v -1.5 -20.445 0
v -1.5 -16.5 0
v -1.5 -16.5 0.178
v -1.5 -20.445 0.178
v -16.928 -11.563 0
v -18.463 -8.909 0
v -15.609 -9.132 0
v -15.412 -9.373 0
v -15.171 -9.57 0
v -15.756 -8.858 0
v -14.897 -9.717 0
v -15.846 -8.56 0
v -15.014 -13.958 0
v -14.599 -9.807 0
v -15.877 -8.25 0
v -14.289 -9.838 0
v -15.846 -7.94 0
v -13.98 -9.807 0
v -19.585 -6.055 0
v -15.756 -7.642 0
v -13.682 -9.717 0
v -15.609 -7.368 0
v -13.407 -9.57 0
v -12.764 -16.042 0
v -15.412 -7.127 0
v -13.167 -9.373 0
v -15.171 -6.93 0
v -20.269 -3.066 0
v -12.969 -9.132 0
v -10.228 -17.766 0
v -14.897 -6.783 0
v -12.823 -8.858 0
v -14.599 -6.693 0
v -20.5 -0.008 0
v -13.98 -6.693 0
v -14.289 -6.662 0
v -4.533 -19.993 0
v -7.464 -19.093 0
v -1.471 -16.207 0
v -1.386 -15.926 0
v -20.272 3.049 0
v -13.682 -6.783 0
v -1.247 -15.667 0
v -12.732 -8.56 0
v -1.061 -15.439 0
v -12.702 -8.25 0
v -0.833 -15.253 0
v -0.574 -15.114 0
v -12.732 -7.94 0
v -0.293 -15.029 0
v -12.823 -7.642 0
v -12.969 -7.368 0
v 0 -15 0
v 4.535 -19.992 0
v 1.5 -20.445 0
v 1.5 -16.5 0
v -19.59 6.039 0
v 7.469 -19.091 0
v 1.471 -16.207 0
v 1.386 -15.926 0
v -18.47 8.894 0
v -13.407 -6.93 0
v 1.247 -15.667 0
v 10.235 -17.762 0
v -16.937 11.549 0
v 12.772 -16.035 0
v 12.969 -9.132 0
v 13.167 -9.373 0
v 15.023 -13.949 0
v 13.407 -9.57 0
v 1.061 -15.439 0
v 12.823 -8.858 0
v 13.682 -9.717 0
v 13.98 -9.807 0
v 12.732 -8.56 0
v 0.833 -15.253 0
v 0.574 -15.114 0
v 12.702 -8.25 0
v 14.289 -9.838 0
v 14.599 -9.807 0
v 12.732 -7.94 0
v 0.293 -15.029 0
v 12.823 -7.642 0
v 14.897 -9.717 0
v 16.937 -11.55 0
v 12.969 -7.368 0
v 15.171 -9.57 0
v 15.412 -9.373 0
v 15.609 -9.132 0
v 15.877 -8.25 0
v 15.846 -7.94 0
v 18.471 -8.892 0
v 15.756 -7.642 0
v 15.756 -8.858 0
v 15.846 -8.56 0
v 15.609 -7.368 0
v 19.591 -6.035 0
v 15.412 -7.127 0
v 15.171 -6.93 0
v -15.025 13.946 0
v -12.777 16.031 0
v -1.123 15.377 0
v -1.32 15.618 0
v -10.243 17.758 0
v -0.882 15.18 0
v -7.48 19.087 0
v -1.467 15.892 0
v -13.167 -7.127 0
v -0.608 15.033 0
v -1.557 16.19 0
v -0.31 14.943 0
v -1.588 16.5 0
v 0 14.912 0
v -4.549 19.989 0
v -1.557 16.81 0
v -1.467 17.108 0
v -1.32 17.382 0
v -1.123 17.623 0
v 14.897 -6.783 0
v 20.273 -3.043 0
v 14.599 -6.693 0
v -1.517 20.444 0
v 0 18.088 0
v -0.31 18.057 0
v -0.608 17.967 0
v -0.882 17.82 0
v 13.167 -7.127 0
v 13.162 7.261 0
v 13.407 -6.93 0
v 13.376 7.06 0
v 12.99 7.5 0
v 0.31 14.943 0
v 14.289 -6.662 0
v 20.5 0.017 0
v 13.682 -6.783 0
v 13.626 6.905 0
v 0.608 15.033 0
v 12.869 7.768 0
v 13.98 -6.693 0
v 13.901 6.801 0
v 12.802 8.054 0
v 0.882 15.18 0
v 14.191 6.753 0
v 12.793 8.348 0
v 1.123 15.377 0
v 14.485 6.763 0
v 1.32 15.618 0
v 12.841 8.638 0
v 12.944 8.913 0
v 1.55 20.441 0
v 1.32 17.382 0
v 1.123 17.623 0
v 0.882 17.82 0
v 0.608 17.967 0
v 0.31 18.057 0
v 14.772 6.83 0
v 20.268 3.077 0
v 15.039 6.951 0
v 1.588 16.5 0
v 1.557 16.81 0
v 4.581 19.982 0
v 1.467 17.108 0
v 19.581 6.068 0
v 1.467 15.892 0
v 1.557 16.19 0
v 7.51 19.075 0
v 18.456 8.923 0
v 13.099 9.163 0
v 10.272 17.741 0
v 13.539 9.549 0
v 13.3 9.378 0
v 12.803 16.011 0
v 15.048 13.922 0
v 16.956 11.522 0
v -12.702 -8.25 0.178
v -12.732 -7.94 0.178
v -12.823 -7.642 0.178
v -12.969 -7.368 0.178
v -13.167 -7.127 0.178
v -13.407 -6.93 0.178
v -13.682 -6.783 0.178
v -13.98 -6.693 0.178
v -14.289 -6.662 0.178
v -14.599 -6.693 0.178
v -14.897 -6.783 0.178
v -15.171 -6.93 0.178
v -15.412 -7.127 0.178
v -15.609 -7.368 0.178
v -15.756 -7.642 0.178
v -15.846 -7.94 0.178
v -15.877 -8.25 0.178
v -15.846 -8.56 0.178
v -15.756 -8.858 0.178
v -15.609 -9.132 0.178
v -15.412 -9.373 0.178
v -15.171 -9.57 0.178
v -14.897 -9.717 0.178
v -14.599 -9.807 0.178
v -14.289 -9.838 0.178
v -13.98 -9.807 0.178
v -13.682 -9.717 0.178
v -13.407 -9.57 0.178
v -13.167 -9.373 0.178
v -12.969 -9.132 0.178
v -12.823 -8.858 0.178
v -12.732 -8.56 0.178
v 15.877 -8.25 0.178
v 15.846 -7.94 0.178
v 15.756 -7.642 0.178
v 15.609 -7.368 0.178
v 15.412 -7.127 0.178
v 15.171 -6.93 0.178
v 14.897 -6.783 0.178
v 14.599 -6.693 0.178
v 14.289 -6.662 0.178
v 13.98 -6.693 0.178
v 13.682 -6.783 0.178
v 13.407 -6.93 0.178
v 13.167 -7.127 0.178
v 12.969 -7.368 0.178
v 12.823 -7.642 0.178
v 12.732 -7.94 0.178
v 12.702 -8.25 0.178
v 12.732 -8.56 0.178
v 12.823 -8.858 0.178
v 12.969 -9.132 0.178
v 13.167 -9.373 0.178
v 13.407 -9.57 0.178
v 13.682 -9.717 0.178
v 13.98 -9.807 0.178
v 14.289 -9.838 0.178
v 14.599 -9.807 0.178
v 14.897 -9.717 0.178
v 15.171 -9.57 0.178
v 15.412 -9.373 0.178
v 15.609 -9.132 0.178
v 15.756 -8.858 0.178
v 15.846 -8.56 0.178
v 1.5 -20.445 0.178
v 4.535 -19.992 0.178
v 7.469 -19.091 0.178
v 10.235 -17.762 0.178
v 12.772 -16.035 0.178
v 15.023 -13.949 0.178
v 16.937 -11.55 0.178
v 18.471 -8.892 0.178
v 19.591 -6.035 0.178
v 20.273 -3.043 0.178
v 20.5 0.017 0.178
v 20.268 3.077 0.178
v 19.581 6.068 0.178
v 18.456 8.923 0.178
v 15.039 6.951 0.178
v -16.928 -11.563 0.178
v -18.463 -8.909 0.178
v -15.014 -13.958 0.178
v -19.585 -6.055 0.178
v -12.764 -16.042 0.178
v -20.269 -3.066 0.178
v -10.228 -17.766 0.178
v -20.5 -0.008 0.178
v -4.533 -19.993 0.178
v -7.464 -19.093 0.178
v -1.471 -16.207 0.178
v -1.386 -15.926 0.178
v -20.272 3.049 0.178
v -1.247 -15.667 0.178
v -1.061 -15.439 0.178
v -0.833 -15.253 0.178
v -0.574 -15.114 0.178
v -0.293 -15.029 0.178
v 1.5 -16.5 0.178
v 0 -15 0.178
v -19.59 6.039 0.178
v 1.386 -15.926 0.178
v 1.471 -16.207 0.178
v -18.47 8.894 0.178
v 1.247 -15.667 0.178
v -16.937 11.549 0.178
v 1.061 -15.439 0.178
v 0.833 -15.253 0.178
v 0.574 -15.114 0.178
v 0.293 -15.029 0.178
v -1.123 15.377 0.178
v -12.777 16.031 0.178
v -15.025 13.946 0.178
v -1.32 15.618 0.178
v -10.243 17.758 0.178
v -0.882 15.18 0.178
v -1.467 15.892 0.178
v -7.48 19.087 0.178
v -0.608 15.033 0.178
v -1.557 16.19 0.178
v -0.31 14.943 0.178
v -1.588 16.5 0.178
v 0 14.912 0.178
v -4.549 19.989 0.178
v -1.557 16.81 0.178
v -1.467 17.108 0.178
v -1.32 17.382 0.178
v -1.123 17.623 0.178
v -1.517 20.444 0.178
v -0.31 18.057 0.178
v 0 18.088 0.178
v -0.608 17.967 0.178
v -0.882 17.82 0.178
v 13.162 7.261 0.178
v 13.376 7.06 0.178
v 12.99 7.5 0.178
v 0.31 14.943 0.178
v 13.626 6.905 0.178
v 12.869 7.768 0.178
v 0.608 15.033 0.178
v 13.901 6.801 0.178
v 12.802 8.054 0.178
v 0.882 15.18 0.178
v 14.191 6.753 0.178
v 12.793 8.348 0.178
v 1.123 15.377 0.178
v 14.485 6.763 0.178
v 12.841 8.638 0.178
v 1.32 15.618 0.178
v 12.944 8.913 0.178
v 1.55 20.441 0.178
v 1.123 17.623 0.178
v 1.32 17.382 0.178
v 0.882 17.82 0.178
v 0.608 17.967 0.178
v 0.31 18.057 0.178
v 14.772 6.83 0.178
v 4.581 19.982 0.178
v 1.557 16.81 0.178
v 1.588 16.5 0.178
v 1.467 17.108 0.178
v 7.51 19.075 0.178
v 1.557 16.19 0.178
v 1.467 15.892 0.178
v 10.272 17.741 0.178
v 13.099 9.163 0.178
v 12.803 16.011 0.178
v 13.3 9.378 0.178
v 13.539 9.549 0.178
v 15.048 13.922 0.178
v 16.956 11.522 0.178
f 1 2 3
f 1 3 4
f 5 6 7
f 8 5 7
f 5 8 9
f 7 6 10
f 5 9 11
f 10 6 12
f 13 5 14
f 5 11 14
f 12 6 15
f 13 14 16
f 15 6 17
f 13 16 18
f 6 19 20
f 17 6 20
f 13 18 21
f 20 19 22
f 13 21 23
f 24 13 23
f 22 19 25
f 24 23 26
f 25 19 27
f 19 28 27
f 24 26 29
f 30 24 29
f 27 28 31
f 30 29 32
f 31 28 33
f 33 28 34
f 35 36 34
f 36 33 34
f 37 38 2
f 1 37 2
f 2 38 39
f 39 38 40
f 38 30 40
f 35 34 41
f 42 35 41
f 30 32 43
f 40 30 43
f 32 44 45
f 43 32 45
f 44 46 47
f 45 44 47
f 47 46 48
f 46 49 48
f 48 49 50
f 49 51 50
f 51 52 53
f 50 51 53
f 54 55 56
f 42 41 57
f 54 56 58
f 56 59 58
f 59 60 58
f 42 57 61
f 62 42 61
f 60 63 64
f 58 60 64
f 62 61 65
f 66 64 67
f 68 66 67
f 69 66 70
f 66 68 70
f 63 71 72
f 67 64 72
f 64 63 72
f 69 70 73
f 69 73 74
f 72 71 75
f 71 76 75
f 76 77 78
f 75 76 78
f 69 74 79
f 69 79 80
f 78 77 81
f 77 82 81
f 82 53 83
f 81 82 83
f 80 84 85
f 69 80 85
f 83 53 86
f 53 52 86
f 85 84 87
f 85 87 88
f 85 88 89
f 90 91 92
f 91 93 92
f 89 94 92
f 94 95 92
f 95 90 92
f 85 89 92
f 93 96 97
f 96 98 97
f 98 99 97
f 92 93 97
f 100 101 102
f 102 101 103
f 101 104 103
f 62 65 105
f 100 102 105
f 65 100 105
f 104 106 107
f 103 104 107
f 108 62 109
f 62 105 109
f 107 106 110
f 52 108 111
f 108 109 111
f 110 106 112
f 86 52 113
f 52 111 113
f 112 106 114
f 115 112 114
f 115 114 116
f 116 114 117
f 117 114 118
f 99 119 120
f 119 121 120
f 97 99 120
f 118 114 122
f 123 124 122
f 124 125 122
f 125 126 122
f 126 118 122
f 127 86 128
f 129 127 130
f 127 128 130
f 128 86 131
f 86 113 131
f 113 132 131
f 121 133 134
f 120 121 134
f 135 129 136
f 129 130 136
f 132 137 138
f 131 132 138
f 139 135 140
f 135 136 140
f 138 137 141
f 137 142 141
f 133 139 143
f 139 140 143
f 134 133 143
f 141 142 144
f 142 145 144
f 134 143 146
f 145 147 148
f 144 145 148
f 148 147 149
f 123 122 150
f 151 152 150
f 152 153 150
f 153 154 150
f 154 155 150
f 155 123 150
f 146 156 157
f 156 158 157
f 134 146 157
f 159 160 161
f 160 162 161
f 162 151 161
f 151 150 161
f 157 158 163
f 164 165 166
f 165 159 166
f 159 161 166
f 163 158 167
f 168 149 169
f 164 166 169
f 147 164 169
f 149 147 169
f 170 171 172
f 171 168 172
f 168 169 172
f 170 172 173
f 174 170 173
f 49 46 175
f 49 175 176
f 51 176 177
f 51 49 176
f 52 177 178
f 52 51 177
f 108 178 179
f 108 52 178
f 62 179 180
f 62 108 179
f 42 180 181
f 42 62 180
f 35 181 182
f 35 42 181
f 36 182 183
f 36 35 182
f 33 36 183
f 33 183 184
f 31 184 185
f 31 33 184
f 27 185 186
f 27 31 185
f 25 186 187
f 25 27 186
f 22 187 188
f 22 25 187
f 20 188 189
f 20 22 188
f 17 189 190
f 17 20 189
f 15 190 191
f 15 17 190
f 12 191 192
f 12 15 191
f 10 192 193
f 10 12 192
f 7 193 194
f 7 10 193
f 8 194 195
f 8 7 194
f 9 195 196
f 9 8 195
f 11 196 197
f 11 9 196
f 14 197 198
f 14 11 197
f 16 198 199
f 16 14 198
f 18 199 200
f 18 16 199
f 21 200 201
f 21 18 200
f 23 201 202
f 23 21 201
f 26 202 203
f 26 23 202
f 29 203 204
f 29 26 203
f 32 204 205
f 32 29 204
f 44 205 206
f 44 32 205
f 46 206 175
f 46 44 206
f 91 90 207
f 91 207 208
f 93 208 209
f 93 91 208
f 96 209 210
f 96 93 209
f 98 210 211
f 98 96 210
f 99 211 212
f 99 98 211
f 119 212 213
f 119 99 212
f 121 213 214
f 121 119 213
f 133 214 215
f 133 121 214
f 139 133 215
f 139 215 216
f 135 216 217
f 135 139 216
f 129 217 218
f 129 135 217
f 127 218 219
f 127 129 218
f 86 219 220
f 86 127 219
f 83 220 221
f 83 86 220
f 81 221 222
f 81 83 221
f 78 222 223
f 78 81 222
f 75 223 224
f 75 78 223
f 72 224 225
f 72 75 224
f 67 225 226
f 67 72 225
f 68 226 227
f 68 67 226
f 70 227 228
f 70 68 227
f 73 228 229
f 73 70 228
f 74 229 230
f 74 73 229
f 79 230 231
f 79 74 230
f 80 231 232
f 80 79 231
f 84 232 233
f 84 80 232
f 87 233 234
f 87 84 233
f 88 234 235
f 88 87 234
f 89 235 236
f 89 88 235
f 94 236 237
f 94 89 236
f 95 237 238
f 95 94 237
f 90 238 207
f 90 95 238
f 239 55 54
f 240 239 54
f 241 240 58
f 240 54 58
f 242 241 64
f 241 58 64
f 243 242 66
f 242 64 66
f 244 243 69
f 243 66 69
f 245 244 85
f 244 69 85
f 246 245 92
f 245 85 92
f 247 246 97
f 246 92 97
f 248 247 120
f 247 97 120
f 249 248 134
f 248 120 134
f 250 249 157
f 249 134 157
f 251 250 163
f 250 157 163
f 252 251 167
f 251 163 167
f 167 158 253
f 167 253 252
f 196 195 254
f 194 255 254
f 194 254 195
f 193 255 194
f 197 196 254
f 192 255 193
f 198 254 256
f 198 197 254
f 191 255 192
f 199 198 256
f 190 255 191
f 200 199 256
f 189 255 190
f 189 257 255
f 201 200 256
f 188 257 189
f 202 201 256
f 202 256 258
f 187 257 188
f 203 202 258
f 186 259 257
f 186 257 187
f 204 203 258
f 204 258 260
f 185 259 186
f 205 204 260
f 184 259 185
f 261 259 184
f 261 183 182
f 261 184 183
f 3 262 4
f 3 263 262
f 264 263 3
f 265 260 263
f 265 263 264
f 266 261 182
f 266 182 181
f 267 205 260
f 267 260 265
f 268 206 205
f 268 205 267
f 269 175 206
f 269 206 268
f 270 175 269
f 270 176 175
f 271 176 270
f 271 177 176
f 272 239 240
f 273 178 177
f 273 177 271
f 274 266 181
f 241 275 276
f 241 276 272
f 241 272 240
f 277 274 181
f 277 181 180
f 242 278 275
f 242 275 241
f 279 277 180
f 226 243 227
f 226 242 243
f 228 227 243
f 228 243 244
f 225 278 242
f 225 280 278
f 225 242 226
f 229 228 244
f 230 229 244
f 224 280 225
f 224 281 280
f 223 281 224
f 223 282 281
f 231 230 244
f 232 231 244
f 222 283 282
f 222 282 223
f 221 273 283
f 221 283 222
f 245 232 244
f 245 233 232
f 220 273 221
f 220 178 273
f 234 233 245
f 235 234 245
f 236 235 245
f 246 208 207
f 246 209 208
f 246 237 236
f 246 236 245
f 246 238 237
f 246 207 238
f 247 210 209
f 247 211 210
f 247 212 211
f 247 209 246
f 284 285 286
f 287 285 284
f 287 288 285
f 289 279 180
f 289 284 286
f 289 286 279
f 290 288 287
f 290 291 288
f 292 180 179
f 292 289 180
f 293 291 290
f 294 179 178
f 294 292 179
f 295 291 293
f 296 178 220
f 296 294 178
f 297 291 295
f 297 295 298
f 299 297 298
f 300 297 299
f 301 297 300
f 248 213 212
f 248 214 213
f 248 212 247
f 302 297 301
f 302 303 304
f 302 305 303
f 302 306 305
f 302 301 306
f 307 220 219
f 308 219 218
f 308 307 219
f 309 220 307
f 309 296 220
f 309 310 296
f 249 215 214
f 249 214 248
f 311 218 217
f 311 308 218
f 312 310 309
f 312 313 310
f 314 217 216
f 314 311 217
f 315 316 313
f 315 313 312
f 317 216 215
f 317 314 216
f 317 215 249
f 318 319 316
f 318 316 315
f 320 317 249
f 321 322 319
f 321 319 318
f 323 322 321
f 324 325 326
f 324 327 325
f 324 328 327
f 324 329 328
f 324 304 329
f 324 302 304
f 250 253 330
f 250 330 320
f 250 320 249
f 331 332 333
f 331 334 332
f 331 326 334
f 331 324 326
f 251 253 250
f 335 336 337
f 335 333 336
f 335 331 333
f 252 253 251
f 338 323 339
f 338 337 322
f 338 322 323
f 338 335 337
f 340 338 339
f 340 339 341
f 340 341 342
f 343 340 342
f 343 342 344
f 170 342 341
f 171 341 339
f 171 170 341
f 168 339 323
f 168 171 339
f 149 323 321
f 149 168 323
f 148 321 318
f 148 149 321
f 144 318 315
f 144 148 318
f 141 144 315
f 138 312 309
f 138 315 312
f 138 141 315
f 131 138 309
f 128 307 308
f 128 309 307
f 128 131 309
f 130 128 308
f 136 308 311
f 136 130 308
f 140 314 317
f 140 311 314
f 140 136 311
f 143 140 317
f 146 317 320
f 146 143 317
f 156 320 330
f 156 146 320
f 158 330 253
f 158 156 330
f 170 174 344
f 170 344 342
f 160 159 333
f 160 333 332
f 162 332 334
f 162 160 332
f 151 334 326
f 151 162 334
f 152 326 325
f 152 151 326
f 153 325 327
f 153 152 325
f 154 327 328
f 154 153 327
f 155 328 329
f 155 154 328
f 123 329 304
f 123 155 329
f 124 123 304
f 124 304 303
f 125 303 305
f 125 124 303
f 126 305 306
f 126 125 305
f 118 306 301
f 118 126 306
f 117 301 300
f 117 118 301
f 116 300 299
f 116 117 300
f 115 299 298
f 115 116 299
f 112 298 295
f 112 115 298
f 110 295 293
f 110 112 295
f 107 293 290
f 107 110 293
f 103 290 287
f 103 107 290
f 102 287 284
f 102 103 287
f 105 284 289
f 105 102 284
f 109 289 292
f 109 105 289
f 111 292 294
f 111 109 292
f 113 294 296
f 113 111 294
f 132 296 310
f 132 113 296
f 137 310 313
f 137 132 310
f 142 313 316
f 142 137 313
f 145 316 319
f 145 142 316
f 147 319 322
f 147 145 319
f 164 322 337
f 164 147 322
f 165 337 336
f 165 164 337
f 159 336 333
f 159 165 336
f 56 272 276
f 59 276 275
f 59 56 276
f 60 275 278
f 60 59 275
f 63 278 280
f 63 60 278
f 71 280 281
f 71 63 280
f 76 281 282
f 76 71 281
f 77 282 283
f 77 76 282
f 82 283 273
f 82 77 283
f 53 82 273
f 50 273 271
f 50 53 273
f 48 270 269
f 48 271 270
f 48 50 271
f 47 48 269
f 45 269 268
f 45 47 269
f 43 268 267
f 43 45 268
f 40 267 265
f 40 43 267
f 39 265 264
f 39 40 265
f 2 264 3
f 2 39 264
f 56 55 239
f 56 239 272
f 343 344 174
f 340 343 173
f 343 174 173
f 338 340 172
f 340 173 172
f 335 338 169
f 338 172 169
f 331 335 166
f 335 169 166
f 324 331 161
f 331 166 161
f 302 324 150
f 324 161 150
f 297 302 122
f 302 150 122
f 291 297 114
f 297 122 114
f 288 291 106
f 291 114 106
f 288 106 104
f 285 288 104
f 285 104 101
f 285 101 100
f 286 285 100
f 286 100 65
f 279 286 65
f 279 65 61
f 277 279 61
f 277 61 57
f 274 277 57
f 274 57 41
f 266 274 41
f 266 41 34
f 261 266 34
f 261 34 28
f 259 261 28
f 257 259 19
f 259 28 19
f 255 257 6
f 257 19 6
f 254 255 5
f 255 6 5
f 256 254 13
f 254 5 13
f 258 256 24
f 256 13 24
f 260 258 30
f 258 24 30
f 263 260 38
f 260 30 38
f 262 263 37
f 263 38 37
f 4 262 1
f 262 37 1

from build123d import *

# Parameters (mm, degrees)
SKETCH3_R          = 20.5
SKETCH3_R_2        = 1.5875
EXTRUDE2_DEPTH     = 0.1778
SKETCH5_R          = 1.5
CUT_EXTRUDE1_DEPTH = 29.991923235
CIRPATTERN1_COUNT  = 3


with BuildPart() as part:
    # Sketch3 → Extrude2 (new body)
    with BuildSketch(Plane.XY):
        Circle(SKETCH3_R)
        with Locations((0, 16.5)):
            Circle(SKETCH3_R_2, mode=Mode.SUBTRACT)
        with Locations((14.289419162, -8.25)):
            Circle(SKETCH3_R_2, mode=Mode.SUBTRACT)
        with Locations((-14.289419162, -8.25)):
            Circle(SKETCH3_R_2, mode=Mode.SUBTRACT)
    extrude(amount=EXTRUDE2_DEPTH)

    # Sketch5 → Cut-Extrude1 (cut, through all)
    with BuildSketch(Plane.XY):
        with BuildLine():
            Line((1.5, -20.4450483), (1.5, -16.5))
            ThreePointArc((1.5, -16.5), (0, -18), (-1.5, -16.5))
            Line((-1.5, -16.5), (-1.5, -20.4450483))
            ThreePointArc((-1.5, -20.4450483), (0, -20.5), (1.5, -20.4450483))
        make_face()
        with Locations((0, -16.5)):
            Circle(SKETCH5_R)
    cut_extrude1 = extrude(amount=CUT_EXTRUDE1_DEPTH, mode=Mode.SUBTRACT)

    # CirPattern1: Cut-Extrude1 ×3 about axis, 1 skipped
    cirpattern1_axis = Axis((0, 0, 0.1778), (0, 0, -1))
    add([cut_extrude1.rotate(cirpattern1_axis, i * 360 / CIRPATTERN1_COUNT) for i in range(1, CIRPATTERN1_COUNT) if i not in (1,)], mode=Mode.SUBTRACT)


solid = part.part
